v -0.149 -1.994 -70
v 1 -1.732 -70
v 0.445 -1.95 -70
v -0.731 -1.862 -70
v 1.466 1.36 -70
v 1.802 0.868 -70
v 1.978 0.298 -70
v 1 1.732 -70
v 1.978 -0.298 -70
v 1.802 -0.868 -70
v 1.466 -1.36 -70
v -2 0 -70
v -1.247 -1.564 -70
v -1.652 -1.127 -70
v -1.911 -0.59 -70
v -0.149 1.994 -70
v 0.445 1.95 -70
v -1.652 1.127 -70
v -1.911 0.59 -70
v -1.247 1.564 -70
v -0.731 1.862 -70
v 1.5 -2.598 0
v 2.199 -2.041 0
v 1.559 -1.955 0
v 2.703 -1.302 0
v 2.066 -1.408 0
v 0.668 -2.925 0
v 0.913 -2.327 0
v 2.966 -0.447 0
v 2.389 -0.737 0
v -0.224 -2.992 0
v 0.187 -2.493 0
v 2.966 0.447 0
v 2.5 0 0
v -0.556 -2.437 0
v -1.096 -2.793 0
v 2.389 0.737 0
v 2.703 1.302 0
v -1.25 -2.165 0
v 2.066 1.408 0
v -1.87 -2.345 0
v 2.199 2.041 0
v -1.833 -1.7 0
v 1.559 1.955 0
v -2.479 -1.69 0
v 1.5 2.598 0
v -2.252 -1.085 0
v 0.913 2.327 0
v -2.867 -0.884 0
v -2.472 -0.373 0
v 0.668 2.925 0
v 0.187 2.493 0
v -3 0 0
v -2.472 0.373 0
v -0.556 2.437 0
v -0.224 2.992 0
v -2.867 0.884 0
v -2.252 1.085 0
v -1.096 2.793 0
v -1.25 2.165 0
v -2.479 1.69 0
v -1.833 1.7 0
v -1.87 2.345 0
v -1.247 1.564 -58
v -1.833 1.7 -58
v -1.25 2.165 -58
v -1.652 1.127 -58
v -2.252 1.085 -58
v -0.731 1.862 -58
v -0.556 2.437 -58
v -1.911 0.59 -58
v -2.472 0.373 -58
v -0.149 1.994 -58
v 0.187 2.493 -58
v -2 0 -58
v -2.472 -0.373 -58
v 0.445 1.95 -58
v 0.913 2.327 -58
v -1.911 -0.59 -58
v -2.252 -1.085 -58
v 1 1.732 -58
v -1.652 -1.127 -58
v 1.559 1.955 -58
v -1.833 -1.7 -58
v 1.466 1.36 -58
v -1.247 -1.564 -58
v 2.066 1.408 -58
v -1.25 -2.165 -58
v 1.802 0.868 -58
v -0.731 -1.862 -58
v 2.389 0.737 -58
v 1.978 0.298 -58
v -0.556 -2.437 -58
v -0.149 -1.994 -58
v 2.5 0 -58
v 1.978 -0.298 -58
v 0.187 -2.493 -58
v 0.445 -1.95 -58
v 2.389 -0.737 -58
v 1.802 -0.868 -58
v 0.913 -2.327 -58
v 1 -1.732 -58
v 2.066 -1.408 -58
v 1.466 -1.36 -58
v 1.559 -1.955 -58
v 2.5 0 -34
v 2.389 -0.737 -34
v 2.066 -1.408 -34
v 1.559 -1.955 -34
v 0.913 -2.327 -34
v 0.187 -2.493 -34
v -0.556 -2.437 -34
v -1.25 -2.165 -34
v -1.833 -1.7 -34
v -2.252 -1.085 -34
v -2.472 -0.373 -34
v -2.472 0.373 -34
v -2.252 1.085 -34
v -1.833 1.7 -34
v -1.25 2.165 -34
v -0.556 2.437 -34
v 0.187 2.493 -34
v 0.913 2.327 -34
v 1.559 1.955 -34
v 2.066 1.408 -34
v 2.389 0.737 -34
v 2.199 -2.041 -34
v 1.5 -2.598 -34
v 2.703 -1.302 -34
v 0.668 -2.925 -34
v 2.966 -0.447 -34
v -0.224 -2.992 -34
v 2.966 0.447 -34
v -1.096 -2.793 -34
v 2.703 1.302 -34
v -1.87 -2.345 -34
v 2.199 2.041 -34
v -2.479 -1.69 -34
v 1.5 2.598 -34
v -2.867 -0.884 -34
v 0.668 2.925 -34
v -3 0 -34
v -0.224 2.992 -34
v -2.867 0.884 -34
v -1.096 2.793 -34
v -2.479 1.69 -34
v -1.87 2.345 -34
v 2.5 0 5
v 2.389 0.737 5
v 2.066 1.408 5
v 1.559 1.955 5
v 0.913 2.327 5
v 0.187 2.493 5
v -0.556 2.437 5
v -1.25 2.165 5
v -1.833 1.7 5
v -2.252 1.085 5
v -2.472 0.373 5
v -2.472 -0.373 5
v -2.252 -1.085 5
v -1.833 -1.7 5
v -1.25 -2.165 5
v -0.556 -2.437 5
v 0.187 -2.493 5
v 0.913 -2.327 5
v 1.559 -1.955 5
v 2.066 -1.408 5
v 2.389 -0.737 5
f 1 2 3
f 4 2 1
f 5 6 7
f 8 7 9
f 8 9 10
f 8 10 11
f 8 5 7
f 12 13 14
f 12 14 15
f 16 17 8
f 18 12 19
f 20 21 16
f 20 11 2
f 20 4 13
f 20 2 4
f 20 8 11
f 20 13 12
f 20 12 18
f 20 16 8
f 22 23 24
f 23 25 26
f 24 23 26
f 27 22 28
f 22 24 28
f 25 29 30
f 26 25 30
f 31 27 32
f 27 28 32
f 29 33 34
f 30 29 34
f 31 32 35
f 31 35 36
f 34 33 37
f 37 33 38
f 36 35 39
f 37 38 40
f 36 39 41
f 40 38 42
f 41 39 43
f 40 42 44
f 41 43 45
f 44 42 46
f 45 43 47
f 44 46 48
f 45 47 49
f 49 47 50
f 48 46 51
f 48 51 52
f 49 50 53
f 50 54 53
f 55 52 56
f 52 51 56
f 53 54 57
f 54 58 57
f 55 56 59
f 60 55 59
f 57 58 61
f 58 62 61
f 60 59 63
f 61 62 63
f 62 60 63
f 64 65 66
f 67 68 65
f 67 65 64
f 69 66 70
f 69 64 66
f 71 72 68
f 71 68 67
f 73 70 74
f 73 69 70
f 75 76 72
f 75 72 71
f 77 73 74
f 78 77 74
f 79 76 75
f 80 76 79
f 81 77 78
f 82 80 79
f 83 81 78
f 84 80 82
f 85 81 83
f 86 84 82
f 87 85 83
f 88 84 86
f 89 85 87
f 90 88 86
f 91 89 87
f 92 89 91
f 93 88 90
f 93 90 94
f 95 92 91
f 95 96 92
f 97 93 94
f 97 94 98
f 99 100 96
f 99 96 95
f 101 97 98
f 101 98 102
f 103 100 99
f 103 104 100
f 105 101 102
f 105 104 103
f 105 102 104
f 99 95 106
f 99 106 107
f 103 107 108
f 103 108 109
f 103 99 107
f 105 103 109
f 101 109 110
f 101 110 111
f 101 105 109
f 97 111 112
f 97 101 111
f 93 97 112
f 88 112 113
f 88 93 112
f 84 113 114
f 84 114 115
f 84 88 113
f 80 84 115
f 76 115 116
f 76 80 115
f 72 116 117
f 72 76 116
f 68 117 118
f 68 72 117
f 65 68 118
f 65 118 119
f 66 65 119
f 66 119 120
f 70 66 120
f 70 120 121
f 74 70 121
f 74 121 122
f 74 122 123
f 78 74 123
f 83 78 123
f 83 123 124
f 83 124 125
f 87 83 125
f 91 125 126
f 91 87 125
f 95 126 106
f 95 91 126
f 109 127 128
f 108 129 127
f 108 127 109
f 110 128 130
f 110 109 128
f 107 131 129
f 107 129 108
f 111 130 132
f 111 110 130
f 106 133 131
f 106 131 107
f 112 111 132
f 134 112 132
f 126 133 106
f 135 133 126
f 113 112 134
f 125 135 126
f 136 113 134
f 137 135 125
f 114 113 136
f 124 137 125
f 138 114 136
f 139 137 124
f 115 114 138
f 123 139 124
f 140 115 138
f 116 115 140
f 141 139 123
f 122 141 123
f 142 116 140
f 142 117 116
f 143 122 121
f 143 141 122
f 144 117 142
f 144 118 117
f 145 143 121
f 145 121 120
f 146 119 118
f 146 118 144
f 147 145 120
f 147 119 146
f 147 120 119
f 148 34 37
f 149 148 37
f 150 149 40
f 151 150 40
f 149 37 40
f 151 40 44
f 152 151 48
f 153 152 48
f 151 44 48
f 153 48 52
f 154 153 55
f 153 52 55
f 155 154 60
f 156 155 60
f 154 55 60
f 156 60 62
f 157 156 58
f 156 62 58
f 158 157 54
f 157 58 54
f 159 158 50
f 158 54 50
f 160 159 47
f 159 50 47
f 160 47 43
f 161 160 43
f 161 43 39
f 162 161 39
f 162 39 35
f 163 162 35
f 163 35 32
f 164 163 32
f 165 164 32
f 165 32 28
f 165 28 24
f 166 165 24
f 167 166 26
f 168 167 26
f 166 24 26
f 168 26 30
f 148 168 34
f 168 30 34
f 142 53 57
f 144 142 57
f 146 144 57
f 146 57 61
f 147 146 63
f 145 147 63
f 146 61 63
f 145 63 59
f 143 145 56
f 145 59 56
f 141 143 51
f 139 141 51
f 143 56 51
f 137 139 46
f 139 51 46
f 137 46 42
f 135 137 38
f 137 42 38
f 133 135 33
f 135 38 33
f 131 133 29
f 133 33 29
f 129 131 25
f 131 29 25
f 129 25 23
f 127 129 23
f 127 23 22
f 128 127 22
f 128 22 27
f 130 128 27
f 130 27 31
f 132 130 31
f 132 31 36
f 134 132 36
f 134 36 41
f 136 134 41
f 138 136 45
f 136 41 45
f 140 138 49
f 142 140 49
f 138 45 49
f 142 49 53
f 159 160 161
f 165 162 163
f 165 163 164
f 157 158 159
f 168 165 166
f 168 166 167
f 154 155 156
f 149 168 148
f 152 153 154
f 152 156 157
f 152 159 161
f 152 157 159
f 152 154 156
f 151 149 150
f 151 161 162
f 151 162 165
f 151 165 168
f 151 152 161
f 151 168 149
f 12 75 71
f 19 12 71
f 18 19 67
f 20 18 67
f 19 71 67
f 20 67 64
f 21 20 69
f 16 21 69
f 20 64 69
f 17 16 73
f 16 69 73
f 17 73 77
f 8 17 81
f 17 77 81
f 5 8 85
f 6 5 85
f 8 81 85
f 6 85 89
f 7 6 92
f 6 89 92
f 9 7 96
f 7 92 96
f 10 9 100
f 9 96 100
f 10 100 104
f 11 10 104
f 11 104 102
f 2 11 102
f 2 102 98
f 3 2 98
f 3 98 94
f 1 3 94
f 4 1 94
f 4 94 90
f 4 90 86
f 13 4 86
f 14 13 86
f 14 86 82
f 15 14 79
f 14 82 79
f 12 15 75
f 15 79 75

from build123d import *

# Parameters (mm, degrees)
SKETCH_1_R      = 2.5
EXTRUDE_1_DEPTH = 5
SKETCH_2_R      = 3
EXTRUDE_2_DEPTH = 34
EXTRUDE_START   = 24
SKETCH_3_R      = 2.5
EXTRUDE_3_DEPTH = 24
SKETCH_4_R      = 2
EXTRUDE_4_DEPTH = 12


with BuildPart() as part:
    # 草图1 → 凸台-拉伸1 (new body)
    with BuildSketch(Plane.XY):
        Circle(SKETCH_1_R)
    extrude(amount=EXTRUDE_1_DEPTH)

    # 草图2 → 凸台-拉伸2 (add)
    with BuildSketch(Plane(origin=(0, 0, 0), x_dir=(-1, 0, 0), z_dir=(0, 0, -1))):
        Circle(SKETCH_2_R)
    extrude(amount=EXTRUDE_2_DEPTH)

    # 草图3 → 凸台-拉伸3 (add)
    with BuildSketch(Plane(origin=(0, 0, -34), x_dir=(-1, 0, 0), z_dir=(0, 0, -1)).offset(EXTRUDE_START)):
        with Locations(Location((0, 0, 0), (0, 0, 180))):
            Circle(SKETCH_3_R)
    extrude(amount=-EXTRUDE_3_DEPTH)

    # 草图4 → 凸台-拉伸4 (add)
    with BuildSketch(Plane(origin=(0, 0, -58), x_dir=(-1, 0, 0), z_dir=(0, 0, -1))):
        Circle(SKETCH_4_R)
    extrude(amount=EXTRUDE_4_DEPTH)


solid = part.part
